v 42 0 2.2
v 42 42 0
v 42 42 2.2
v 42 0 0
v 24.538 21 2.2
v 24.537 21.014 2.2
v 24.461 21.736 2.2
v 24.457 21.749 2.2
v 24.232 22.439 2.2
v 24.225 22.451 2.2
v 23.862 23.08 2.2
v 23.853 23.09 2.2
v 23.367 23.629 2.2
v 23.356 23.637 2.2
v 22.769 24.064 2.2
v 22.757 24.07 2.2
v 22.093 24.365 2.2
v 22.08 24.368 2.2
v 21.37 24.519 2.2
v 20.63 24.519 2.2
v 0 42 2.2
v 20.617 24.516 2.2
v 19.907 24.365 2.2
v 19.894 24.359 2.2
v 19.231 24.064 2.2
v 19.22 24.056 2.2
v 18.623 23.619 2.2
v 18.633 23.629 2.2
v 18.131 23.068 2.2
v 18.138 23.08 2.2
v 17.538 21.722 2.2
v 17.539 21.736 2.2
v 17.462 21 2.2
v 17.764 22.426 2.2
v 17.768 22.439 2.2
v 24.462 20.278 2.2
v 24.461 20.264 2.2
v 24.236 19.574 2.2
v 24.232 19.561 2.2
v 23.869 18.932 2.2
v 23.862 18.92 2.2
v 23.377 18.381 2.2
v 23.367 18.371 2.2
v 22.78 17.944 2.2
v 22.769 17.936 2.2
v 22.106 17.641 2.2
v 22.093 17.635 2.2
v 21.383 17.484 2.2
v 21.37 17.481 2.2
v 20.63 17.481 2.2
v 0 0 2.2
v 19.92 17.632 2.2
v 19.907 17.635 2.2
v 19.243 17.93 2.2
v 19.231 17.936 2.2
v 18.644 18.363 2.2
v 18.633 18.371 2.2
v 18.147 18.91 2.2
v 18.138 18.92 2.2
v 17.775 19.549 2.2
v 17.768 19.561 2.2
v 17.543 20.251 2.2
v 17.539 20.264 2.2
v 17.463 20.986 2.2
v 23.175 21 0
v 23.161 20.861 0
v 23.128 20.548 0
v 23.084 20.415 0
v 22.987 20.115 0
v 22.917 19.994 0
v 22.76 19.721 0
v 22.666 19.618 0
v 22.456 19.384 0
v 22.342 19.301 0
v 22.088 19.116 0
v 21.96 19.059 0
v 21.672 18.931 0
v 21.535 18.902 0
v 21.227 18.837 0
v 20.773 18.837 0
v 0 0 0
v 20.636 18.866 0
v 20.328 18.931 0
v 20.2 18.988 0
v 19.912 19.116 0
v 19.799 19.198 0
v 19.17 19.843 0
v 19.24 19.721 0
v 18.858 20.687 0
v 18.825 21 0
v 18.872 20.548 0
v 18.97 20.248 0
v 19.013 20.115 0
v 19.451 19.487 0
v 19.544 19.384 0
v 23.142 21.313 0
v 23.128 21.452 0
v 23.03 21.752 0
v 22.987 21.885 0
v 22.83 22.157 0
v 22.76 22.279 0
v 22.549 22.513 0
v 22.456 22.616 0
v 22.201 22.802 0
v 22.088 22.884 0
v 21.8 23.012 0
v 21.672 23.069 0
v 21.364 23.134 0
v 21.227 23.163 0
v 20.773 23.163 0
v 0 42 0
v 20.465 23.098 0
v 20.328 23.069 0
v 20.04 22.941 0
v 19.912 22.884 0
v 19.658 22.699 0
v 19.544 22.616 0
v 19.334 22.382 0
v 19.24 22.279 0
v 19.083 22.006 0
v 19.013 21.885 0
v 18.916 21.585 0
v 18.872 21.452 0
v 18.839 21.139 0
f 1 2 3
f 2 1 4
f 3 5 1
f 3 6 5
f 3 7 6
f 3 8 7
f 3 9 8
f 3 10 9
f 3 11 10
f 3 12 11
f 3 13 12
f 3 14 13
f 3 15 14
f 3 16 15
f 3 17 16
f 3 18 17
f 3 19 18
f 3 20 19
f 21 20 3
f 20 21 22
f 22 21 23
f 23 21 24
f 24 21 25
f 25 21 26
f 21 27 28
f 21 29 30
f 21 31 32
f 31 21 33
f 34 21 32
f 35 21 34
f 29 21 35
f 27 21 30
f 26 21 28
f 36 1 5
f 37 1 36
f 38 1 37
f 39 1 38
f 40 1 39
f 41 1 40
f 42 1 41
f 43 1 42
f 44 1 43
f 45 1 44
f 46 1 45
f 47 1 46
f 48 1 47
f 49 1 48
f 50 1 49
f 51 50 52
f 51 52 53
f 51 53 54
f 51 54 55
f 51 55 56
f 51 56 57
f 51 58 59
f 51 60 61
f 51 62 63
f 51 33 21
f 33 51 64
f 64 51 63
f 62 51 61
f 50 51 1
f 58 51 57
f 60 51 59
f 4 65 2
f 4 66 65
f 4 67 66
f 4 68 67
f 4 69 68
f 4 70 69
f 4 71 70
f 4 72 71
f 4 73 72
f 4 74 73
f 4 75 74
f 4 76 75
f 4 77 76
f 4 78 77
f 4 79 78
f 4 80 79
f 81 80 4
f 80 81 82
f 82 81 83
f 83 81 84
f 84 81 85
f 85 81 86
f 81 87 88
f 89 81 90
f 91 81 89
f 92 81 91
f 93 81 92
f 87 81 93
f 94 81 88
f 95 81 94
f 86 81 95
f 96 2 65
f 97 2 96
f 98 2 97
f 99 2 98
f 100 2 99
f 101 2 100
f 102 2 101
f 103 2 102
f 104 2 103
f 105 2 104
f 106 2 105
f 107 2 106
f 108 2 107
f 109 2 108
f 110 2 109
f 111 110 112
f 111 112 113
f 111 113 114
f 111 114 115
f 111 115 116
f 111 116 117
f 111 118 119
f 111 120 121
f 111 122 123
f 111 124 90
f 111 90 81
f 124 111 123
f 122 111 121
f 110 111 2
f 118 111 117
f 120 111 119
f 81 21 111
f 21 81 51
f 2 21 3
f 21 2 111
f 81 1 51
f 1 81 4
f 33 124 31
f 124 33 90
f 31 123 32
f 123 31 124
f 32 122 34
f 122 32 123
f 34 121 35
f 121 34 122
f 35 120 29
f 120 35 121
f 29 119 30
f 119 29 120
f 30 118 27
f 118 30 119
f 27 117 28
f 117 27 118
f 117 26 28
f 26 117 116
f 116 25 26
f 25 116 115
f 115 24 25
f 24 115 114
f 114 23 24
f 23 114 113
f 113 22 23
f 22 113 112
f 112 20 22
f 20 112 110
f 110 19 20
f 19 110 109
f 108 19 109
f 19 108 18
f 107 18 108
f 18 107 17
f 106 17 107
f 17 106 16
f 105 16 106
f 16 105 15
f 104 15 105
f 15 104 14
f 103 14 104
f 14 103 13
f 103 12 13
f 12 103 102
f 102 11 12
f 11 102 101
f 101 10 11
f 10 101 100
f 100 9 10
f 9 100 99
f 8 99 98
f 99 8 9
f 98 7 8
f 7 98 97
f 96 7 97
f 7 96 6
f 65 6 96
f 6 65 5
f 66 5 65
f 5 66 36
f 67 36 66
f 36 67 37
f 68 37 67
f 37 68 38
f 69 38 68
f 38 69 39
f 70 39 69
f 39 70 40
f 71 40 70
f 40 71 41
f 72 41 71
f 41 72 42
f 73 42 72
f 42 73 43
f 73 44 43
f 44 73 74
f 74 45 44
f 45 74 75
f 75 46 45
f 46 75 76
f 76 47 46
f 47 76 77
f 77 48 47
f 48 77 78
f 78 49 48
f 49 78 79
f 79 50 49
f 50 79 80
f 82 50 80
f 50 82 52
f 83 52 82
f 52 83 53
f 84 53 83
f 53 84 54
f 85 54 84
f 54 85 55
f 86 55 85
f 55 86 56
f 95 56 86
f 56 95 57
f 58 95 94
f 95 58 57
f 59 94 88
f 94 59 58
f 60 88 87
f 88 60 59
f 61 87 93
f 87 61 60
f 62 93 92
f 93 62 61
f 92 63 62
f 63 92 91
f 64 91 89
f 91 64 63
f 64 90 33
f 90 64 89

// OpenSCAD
// file: Parts/Screw.scad
// created by IndiePandaaaaa | Lukas

function cone_diameter(diameter) = diameter * 2;

function cone_height(diameter) = diameter * 0.75;

module screw(diameter, length, cutout_sample = false, fs = 0.1, fa = 1) {
    //$fs = 0.1; [size in mm] | $fa = 1; [degrees]
    //$fn = 100; [defined faces]

    module base_model(diameter, length, cone_height, cone_diameter, offset = 0, fs = 0.1, fa = 1) {
        rotate_extrude($fs = fs) {
            polygon([
                    [0, 0],
                    [(diameter + offset) / 2, 0],
                    [(diameter + offset) / 2, (length + offset) - (cone_height + offset)],
                    [(cone_diameter + offset) / 2, length + offset],
                    [0, length + offset],
                ]);
        }
    }

    if (length < diameter) {
        echo("Screw is too short");
        length = diameter + 1;
        echo("New length is: ", length);
    }

    if (!cutout_sample) {
        translate([0, 0, - length])
            difference() {
                base_model(diameter, length, cone_height(diameter), cone_diameter(diameter));

                // top cross part
                translate([0, 0, length + 0.1 - (cone_height(diameter) - diameter / 2)])
                    difference() {
                        rotate([0, 0, 45])
                            rotate_extrude($fn = 4) {
                                polygon([
                                        [0, 0],
                                        [diameter * 1.4 / 2, 0],
                                        [cone_diameter(diameter) / 2, cone_height(diameter) - diameter / 2],
                                        [0, cone_height(diameter) - diameter / 2],
                                    ]);
                            }
                        for (i = [0 : 1 : 3]) {
                            rotate([0, 0, 90 * i])
                                translate([diameter / 3.18 / 2, diameter / 3.18 / 2, - 0.1])
                                    cube(cone_height(diameter) + 0.2);
                        }
                    }
            }
    } else {
        offset = 0.2;
        translate([0, 0, - length - offset / 2])
            base_model(diameter, length, cone_height(diameter), cone_diameter(diameter), offset);
    }
}

screw(3.5, 12);
// main file
// created by IndiePandaaaaa|Lukas

use <Parts/Screw.scad>

SCREW_OD = 3.5;
SIZE = 42;
HEIGHT = 2.2;

difference() {
    cube([42, 42, 2.2]);
    translate([SIZE / 2, SIZE / 2, HEIGHT]) screw(SCREW_OD, 12, true);
}
